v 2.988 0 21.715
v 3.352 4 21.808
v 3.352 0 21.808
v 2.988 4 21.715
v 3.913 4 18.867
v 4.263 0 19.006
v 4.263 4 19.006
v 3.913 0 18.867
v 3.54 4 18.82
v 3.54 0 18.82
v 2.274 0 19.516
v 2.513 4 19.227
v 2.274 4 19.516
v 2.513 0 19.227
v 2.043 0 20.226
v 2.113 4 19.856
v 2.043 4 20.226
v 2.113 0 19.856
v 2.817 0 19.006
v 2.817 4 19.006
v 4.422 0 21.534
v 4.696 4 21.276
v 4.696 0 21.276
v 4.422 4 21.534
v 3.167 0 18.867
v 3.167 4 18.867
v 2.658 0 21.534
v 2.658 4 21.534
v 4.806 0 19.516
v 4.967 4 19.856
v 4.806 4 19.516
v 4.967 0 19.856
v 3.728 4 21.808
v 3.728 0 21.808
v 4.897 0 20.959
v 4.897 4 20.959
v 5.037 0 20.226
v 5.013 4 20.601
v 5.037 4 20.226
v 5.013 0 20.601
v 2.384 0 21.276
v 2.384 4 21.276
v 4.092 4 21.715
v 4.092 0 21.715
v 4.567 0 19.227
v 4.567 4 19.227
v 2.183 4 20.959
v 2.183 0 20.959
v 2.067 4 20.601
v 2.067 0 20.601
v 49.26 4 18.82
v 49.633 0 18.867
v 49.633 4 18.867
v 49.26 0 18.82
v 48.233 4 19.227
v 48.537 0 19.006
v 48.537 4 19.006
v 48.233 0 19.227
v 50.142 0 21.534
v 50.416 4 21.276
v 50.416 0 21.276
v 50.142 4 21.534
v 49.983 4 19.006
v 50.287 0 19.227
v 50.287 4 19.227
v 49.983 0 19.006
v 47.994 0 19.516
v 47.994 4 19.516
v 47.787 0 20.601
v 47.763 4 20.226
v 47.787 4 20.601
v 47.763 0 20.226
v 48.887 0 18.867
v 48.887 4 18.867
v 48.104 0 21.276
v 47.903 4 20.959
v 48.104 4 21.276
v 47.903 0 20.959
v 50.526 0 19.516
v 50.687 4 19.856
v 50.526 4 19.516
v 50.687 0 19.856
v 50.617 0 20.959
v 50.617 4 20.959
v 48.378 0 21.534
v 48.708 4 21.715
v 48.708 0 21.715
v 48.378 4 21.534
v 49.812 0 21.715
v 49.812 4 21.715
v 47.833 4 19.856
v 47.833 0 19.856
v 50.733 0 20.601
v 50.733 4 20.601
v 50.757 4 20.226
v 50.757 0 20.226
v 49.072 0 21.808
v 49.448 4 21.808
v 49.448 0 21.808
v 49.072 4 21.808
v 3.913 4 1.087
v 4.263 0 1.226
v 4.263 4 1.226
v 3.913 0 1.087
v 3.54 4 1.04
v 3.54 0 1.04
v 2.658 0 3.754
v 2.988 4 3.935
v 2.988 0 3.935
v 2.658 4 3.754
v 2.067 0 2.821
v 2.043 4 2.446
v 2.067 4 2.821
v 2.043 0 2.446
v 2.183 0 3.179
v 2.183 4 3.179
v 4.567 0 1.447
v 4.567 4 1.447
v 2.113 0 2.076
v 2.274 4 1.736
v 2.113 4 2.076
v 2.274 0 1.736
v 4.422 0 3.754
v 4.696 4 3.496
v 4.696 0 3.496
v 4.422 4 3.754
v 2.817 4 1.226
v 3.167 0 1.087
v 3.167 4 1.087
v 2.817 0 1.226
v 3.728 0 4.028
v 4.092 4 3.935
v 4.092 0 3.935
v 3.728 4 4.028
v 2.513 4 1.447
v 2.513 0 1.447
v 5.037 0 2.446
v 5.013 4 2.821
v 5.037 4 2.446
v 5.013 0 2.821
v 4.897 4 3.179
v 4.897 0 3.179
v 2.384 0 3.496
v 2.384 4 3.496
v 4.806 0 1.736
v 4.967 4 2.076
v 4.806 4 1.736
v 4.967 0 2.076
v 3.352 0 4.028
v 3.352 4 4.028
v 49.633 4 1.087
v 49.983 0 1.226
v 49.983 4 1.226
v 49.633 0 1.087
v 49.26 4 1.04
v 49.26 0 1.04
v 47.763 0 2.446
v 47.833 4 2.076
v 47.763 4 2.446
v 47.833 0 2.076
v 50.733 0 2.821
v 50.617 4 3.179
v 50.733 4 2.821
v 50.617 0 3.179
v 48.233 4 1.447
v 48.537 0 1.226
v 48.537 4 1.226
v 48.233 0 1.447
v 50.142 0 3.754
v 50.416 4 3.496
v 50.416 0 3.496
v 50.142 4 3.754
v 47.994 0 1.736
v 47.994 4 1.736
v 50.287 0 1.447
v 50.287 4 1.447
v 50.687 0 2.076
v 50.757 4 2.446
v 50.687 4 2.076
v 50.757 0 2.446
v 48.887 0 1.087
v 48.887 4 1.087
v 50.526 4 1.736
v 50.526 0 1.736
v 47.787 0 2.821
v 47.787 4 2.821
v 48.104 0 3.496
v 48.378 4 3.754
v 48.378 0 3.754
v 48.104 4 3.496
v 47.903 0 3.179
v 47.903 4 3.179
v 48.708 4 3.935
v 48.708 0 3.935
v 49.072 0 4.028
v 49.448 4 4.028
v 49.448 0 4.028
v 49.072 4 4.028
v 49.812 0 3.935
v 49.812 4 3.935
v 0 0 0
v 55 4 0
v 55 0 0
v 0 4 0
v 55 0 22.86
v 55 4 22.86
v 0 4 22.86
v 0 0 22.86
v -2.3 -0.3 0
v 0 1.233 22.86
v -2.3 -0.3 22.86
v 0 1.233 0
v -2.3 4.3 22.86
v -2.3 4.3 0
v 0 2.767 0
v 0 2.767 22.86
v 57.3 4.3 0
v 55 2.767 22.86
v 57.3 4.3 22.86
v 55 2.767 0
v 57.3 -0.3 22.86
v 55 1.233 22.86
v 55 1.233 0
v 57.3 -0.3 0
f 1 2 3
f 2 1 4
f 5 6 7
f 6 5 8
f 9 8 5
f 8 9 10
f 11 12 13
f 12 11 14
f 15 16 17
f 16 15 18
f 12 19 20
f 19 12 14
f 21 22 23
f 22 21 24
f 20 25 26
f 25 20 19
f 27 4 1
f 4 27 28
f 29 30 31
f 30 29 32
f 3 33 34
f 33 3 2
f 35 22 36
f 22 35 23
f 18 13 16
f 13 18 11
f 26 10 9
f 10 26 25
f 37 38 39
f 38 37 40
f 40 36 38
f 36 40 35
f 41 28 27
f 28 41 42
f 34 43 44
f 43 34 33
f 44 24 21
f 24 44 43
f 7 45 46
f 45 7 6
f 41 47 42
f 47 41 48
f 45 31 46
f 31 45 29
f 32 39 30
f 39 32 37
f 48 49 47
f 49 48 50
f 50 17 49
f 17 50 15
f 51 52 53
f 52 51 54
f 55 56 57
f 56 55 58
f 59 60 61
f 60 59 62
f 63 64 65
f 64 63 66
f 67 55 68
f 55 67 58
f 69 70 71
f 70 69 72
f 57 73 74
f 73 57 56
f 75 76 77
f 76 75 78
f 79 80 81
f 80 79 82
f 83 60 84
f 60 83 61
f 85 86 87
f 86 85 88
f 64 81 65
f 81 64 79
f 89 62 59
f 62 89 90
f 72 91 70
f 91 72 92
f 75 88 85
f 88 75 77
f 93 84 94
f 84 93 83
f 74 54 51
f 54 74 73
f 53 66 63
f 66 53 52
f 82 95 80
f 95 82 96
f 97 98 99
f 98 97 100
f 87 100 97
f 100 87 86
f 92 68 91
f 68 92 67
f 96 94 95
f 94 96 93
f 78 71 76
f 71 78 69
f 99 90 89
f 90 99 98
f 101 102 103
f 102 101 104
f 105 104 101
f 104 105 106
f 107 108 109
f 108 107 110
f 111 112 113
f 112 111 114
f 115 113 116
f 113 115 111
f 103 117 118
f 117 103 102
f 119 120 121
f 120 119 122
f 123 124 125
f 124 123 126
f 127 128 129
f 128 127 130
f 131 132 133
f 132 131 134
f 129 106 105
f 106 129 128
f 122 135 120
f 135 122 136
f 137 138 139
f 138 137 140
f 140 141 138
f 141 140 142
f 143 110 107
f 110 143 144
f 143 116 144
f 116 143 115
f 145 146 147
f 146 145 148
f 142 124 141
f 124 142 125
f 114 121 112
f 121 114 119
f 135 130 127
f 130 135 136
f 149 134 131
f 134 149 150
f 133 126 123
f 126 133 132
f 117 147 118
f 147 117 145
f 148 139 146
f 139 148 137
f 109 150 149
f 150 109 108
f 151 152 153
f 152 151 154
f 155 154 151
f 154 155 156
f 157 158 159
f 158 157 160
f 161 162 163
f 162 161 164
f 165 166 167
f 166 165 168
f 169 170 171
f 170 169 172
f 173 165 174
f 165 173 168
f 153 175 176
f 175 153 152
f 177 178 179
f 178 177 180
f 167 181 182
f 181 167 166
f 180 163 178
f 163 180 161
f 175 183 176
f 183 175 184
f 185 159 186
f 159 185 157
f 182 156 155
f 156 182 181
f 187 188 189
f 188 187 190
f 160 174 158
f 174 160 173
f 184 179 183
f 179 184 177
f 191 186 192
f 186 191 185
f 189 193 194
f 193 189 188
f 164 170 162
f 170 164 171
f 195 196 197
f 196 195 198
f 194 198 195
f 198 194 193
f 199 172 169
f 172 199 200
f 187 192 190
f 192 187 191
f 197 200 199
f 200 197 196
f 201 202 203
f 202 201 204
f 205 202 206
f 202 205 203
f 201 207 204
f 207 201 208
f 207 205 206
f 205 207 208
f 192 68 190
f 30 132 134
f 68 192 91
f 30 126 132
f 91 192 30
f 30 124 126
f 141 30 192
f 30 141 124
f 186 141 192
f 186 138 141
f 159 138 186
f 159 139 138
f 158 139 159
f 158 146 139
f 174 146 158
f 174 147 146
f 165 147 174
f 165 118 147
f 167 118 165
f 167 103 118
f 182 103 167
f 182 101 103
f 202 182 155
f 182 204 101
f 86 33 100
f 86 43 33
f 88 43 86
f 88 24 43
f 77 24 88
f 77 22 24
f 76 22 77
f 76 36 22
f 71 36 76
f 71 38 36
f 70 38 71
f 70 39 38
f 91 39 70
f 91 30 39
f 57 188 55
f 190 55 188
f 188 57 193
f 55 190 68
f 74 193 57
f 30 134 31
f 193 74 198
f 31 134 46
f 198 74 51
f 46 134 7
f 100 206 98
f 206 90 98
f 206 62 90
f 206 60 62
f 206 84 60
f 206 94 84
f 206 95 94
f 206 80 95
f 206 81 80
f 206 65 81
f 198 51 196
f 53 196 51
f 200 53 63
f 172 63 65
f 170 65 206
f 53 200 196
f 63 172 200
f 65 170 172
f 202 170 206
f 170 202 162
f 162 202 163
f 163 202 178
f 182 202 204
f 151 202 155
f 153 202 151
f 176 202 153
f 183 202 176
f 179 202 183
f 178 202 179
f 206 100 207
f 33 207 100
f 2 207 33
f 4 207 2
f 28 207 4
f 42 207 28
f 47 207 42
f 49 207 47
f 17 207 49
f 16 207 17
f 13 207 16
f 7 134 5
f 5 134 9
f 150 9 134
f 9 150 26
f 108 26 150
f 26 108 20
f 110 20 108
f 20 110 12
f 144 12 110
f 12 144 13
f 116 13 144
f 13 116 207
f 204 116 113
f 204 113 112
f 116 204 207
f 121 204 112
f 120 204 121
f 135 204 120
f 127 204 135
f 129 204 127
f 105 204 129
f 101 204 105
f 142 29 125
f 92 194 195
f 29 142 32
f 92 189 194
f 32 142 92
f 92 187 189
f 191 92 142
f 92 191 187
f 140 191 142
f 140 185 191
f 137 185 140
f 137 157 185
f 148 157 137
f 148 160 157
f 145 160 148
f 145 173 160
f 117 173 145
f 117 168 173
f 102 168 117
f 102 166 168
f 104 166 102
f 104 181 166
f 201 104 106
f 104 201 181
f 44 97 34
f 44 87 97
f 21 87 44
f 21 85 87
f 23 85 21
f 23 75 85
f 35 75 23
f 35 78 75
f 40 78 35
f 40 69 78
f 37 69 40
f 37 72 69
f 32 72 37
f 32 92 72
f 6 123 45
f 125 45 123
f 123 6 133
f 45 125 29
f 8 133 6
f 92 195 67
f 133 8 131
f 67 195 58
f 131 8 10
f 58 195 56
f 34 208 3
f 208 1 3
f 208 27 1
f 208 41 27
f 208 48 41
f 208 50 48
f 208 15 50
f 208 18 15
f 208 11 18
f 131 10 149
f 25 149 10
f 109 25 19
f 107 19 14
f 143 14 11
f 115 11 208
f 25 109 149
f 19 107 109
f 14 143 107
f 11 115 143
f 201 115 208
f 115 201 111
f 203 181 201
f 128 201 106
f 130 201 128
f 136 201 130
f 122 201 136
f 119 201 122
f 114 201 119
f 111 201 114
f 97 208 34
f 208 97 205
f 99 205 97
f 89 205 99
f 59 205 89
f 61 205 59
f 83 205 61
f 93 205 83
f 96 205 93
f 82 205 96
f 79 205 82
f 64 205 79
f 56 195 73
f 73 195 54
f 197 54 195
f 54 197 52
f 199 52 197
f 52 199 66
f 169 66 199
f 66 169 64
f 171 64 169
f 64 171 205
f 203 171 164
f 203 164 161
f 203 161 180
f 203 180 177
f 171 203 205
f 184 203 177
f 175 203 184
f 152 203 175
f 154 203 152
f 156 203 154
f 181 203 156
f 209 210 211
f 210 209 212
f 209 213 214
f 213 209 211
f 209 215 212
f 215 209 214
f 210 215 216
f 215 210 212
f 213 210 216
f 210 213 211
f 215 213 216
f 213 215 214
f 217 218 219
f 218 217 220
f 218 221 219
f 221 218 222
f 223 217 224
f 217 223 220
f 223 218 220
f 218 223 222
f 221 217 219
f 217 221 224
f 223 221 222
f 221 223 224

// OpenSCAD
// file: board_config.scad
rail_position=20;
rail_height=2.5;
rail_width=5;
mainboard_width=60;
mainboard_height=130;
mainboard_thickness=4;
mainboard_spacing=10;
deep_holes_spacing=10;
rails=4;


board_attacher_width=4;
board_attacher_height=55;
board_attacher_length=30;

side_panel_height = board_attacher_height + 2*mainboard_thickness;
side_panel_thickness=2;
side_panel_ticks=2;

front_panel_height = board_attacher_height + 2*mainboard_thickness;
front_panel_thickness=2;
front_panel_ticks=2;
front_panel_width = mainboard_height + 2*side_panel_thickness;
// file: dovetail.scad
module dovetail_shape(width, height, length) {
    translate([-width/2,0,0]) linear_extrude(height = length) {
        polygon([[0, 0], [width, 0], [width - width/3, height], [width/3, height]]);
    }
}

module rail(male=false, width, height, length, default_offset=0.2) {
    // male will reduce the width slightly
    offset = male ? default_offset : 0;
    
    translate([0,0,-height+offset]) rotate([90,0,0]) dovetail_shape(width-2*offset,height-offset,length);
}
// file: midiport_ada.scad
module midiport_ada() {
    // origin point is bottom left looking at plate and connectors at the bottom
    // This is a bounding box, the connectors on the back are included in the shape
    plate_width = 20;
    plate_height = 20;
    plate_depth = 2.33;
               
    plate_side_width = 1;
    plug_cut = 13.7;
        
    module plate(width, height, depth, side_width, plug_cut) {
        side_depth = 1.3;
        base_height = 7;
        base_depth = 12.76;
        margin=0.1;
        
        translate([-width/2,-height/2,0]) difference() {
            union() {
                cube([width, height, depth]); // plate
                translate([side_width,0,depth]) cube([width-side_width*2, base_height, base_depth]); // base
            }
            translate([width/2,height/2,-margin/2]) cylinder(h=depth+margin, d=plug_cut);
            translate([-margin/2,-margin/2,depth-side_depth-margin/2]) cube([side_width+margin, height+margin, side_depth+margin]); 
            translate([-margin/2+width-side_width,-margin/2,depth-side_depth-margin/2]) cube([side_width+margin, height+margin, side_depth+margin]); 
        }
    }
    module plug(plug_cut, plate_depth) {
        connectors_safety_zone = 2;
        depth = 9.5 + plate_depth; 
        diameter = 11.7;
        cylinder(depth+connectors_safety_zone, d= diameter);
        translate([0,0,plate_depth]) cylinder(depth+connectors_safety_zone, d=plug_cut);
    }
    color("grey") translate([plate_width/2,0,plate_height/2]) rotate([90,0,180])  union() {
        plate(plate_width,plate_height, plate_depth, plate_side_width,plug_cut);
        translate([0,0,0]) plug(plug_cut,plate_depth);
    }
}
// file: midiboard_spacer.scad
include <common.scad>
use <midiboard_ada.scad>
include <midiboard_ada_config.scad>
include <generic_board.scad>

module midiboard_spacer() {
    $fn=50;
    difference() {
        cylinder(midi_support_spacing, d=bigscrew_head_diameter);
        translate([0,0,-margin/2]) cylinder(midi_support_spacing+margin, d=bigscrew_diameter);
    }
}

midiboard_spacer();
// file: generic_board.scad
include <dovetail.scad>;
include <board_config.scad>;
include <common.scad>;


hole_spacing=10;
front_back_holes_depth=10;

module generic_board_attacher_mating() {
    difference() {
        cube([board_attacher_width,board_attacher_length,board_attacher_height]);
        // non attaching holes
        
        for (z=[1:board_attacher_height/(hole_spacing/2)-1]) translate([0,0,hole_spacing/2*z]) union() {
            /*for (i=[1:board_attacher_length/hole_spacing-1]) 
                translate([-margin,hole_spacing*i,0]) rotate([0,90,0]) 
                    cylinder(board_attacher_width+2*margin,d=bigscrew_diameter, $fn=50);*/
            for (i=[1:board_attacher_length/(hole_spacing/2)]) 
                translate([-margin,hole_spacing*i/2-hole_spacing/4,0]) rotate([0,90,0]) 
                    cylinder(board_attacher_width+2*margin,d=bigscrew_attach_hole_diameter, $fn=50);                
        }
        // vertical attaching holes
        for (i=[1:board_attacher_height/(hole_spacing/2)-1]) 
            union() {
                translate([board_attacher_width/2,front_back_holes_depth+margin,hole_spacing*i/2]) rotate([90,00,0]) 
                    cylinder(front_back_holes_depth+2*margin,d=bigscrew_attach_hole_diameter, $fn=50);             
                translate([board_attacher_width/2,board_attacher_length+margin,hole_spacing*i/2]) rotate([90,00,0]) 
                    cylinder(front_back_holes_depth+2*margin,d=bigscrew_attach_hole_diameter, $fn=50);             
            }
                
    }
}

module generic_board_attacher() {
    union() {
        generic_board_attacher_mating();
        translate([board_attacher_width/2,board_attacher_length,0]) rail(true, rail_width, rail_height, board_attacher_length);  
        translate([board_attacher_width/2,board_attacher_length,board_attacher_height]) rotate([0,180,0]) rail(true, rail_width, rail_height, board_attacher_length);  
    }
}

//generic_board_attacher();
// file: midiboard_ada_config.scad
include <common.scad>;
midi_board_width = 2*inch_to_mm;
midi_board_height = 0.9*inch_to_mm;
midi_board_depth = 1.62;
midi_board_hole_diameter = 2.54;
midi_board_hole_from_side = 0.05*inch_to_mm + midi_board_hole_diameter/2;
midi_board_underclearance = 4.24; // For the optocoupler
midi_support_board_height=1;
midi_support_thickness=4;
midi_support_spacing=midi_board_underclearance;


midi_board_holes = [
   [midi_board_hole_from_side, midi_board_hole_from_side],
   [midi_board_width-midi_board_hole_from_side, midi_board_hole_from_side],
   [midi_board_hole_from_side, midi_board_height-midi_board_hole_from_side],
   [midi_board_width-midi_board_hole_from_side, midi_board_height-midi_board_hole_from_side]
];
// file: midiboard_ada.scad
include <common.scad>
include <midiport_ada.scad>
include <midiboard_ada_config.scad>

module midiboard_ada() {
    // Midi featherwing
    $fn=50;
    port_retreat = 3.2;
    port_left = 5;
    port_right = 26;
    
    width_hole_space = 45;
    height_hole_space = 17.5;
    safety_area = 5;
    margin=0.1;
    translate([0,0,midi_board_underclearance]) union() {
        translate([port_left, port_retreat, midi_board_depth]) midiport_ada(); // out
        translate([port_right, port_retreat, midi_board_depth]) midiport_ada(); // in
        color("green") difference() {
            cube([midi_board_width, midi_board_height, midi_board_depth]);
            for (i=[0:3]) translate([midi_board_holes[i][0], midi_board_holes[i][1], -margin/2])  cylinder(h=midi_board_depth+margin,d=midi_board_hole_diameter);
            
        }
        // safety zone
        color("red") union() {
            translate([safety_area,0,-midi_board_underclearance]) cube([midi_board_width-safety_area*2, midi_board_height, midi_board_underclearance]);
            translate([0,safety_area,-midi_board_underclearance]) cube([midi_board_width, midi_board_height-safety_area*2, midi_board_underclearance]);
        }
    }
}

midiboard_ada();
// file: common.scad
inch_to_mm = 25.4;

margin=0.1;
bigscrew_attach_hole_diameter= 2.44;
bigscrew_diameter = 2.54;
bigscrew_head_diameter = 5;
bigscrew_head_height = 2.1;
// main file
include <common.scad>
use <midiboard_ada.scad>
include <midiboard_ada_config.scad>
include <generic_board.scad>
use <midiboard_spacer.scad>


module support_midiboard_ada(ghost=false) {
    $fn=25;
    if (ghost) {
        translate([0,0,midi_board_width+midi_support_board_height]) rotate([90,90,0]) midiboard_ada();
        for (i=[0:3]) 
          translate([midi_board_holes[i][1],0,midi_board_holes[i][0]+midi_support_board_height]) 
            rotate([90,0,0]) midiboard_spacer();
    }
    
    difference() {
        cube([midi_board_height, midi_support_thickness,board_attacher_height]);
        for (i=[0:3]) 
          translate([midi_board_holes[i][1],margin+midi_support_thickness,midi_board_holes[i][0]+midi_support_board_height]) 
            rotate([90,0,0]) cylinder(20,d=3);
    }
    
    translate([0,midi_support_thickness/2,0]) rotate([0,0,90]) rail(true, rail_width, rail_height, midi_board_height); 
    translate([0,midi_support_thickness/2,board_attacher_height]) rotate([0,180,90]) rail(true, rail_width, rail_height, midi_board_height);  
}

translate([0,0,midi_board_height])rotate([0,90,0]) support_midiboard_ada(false);
